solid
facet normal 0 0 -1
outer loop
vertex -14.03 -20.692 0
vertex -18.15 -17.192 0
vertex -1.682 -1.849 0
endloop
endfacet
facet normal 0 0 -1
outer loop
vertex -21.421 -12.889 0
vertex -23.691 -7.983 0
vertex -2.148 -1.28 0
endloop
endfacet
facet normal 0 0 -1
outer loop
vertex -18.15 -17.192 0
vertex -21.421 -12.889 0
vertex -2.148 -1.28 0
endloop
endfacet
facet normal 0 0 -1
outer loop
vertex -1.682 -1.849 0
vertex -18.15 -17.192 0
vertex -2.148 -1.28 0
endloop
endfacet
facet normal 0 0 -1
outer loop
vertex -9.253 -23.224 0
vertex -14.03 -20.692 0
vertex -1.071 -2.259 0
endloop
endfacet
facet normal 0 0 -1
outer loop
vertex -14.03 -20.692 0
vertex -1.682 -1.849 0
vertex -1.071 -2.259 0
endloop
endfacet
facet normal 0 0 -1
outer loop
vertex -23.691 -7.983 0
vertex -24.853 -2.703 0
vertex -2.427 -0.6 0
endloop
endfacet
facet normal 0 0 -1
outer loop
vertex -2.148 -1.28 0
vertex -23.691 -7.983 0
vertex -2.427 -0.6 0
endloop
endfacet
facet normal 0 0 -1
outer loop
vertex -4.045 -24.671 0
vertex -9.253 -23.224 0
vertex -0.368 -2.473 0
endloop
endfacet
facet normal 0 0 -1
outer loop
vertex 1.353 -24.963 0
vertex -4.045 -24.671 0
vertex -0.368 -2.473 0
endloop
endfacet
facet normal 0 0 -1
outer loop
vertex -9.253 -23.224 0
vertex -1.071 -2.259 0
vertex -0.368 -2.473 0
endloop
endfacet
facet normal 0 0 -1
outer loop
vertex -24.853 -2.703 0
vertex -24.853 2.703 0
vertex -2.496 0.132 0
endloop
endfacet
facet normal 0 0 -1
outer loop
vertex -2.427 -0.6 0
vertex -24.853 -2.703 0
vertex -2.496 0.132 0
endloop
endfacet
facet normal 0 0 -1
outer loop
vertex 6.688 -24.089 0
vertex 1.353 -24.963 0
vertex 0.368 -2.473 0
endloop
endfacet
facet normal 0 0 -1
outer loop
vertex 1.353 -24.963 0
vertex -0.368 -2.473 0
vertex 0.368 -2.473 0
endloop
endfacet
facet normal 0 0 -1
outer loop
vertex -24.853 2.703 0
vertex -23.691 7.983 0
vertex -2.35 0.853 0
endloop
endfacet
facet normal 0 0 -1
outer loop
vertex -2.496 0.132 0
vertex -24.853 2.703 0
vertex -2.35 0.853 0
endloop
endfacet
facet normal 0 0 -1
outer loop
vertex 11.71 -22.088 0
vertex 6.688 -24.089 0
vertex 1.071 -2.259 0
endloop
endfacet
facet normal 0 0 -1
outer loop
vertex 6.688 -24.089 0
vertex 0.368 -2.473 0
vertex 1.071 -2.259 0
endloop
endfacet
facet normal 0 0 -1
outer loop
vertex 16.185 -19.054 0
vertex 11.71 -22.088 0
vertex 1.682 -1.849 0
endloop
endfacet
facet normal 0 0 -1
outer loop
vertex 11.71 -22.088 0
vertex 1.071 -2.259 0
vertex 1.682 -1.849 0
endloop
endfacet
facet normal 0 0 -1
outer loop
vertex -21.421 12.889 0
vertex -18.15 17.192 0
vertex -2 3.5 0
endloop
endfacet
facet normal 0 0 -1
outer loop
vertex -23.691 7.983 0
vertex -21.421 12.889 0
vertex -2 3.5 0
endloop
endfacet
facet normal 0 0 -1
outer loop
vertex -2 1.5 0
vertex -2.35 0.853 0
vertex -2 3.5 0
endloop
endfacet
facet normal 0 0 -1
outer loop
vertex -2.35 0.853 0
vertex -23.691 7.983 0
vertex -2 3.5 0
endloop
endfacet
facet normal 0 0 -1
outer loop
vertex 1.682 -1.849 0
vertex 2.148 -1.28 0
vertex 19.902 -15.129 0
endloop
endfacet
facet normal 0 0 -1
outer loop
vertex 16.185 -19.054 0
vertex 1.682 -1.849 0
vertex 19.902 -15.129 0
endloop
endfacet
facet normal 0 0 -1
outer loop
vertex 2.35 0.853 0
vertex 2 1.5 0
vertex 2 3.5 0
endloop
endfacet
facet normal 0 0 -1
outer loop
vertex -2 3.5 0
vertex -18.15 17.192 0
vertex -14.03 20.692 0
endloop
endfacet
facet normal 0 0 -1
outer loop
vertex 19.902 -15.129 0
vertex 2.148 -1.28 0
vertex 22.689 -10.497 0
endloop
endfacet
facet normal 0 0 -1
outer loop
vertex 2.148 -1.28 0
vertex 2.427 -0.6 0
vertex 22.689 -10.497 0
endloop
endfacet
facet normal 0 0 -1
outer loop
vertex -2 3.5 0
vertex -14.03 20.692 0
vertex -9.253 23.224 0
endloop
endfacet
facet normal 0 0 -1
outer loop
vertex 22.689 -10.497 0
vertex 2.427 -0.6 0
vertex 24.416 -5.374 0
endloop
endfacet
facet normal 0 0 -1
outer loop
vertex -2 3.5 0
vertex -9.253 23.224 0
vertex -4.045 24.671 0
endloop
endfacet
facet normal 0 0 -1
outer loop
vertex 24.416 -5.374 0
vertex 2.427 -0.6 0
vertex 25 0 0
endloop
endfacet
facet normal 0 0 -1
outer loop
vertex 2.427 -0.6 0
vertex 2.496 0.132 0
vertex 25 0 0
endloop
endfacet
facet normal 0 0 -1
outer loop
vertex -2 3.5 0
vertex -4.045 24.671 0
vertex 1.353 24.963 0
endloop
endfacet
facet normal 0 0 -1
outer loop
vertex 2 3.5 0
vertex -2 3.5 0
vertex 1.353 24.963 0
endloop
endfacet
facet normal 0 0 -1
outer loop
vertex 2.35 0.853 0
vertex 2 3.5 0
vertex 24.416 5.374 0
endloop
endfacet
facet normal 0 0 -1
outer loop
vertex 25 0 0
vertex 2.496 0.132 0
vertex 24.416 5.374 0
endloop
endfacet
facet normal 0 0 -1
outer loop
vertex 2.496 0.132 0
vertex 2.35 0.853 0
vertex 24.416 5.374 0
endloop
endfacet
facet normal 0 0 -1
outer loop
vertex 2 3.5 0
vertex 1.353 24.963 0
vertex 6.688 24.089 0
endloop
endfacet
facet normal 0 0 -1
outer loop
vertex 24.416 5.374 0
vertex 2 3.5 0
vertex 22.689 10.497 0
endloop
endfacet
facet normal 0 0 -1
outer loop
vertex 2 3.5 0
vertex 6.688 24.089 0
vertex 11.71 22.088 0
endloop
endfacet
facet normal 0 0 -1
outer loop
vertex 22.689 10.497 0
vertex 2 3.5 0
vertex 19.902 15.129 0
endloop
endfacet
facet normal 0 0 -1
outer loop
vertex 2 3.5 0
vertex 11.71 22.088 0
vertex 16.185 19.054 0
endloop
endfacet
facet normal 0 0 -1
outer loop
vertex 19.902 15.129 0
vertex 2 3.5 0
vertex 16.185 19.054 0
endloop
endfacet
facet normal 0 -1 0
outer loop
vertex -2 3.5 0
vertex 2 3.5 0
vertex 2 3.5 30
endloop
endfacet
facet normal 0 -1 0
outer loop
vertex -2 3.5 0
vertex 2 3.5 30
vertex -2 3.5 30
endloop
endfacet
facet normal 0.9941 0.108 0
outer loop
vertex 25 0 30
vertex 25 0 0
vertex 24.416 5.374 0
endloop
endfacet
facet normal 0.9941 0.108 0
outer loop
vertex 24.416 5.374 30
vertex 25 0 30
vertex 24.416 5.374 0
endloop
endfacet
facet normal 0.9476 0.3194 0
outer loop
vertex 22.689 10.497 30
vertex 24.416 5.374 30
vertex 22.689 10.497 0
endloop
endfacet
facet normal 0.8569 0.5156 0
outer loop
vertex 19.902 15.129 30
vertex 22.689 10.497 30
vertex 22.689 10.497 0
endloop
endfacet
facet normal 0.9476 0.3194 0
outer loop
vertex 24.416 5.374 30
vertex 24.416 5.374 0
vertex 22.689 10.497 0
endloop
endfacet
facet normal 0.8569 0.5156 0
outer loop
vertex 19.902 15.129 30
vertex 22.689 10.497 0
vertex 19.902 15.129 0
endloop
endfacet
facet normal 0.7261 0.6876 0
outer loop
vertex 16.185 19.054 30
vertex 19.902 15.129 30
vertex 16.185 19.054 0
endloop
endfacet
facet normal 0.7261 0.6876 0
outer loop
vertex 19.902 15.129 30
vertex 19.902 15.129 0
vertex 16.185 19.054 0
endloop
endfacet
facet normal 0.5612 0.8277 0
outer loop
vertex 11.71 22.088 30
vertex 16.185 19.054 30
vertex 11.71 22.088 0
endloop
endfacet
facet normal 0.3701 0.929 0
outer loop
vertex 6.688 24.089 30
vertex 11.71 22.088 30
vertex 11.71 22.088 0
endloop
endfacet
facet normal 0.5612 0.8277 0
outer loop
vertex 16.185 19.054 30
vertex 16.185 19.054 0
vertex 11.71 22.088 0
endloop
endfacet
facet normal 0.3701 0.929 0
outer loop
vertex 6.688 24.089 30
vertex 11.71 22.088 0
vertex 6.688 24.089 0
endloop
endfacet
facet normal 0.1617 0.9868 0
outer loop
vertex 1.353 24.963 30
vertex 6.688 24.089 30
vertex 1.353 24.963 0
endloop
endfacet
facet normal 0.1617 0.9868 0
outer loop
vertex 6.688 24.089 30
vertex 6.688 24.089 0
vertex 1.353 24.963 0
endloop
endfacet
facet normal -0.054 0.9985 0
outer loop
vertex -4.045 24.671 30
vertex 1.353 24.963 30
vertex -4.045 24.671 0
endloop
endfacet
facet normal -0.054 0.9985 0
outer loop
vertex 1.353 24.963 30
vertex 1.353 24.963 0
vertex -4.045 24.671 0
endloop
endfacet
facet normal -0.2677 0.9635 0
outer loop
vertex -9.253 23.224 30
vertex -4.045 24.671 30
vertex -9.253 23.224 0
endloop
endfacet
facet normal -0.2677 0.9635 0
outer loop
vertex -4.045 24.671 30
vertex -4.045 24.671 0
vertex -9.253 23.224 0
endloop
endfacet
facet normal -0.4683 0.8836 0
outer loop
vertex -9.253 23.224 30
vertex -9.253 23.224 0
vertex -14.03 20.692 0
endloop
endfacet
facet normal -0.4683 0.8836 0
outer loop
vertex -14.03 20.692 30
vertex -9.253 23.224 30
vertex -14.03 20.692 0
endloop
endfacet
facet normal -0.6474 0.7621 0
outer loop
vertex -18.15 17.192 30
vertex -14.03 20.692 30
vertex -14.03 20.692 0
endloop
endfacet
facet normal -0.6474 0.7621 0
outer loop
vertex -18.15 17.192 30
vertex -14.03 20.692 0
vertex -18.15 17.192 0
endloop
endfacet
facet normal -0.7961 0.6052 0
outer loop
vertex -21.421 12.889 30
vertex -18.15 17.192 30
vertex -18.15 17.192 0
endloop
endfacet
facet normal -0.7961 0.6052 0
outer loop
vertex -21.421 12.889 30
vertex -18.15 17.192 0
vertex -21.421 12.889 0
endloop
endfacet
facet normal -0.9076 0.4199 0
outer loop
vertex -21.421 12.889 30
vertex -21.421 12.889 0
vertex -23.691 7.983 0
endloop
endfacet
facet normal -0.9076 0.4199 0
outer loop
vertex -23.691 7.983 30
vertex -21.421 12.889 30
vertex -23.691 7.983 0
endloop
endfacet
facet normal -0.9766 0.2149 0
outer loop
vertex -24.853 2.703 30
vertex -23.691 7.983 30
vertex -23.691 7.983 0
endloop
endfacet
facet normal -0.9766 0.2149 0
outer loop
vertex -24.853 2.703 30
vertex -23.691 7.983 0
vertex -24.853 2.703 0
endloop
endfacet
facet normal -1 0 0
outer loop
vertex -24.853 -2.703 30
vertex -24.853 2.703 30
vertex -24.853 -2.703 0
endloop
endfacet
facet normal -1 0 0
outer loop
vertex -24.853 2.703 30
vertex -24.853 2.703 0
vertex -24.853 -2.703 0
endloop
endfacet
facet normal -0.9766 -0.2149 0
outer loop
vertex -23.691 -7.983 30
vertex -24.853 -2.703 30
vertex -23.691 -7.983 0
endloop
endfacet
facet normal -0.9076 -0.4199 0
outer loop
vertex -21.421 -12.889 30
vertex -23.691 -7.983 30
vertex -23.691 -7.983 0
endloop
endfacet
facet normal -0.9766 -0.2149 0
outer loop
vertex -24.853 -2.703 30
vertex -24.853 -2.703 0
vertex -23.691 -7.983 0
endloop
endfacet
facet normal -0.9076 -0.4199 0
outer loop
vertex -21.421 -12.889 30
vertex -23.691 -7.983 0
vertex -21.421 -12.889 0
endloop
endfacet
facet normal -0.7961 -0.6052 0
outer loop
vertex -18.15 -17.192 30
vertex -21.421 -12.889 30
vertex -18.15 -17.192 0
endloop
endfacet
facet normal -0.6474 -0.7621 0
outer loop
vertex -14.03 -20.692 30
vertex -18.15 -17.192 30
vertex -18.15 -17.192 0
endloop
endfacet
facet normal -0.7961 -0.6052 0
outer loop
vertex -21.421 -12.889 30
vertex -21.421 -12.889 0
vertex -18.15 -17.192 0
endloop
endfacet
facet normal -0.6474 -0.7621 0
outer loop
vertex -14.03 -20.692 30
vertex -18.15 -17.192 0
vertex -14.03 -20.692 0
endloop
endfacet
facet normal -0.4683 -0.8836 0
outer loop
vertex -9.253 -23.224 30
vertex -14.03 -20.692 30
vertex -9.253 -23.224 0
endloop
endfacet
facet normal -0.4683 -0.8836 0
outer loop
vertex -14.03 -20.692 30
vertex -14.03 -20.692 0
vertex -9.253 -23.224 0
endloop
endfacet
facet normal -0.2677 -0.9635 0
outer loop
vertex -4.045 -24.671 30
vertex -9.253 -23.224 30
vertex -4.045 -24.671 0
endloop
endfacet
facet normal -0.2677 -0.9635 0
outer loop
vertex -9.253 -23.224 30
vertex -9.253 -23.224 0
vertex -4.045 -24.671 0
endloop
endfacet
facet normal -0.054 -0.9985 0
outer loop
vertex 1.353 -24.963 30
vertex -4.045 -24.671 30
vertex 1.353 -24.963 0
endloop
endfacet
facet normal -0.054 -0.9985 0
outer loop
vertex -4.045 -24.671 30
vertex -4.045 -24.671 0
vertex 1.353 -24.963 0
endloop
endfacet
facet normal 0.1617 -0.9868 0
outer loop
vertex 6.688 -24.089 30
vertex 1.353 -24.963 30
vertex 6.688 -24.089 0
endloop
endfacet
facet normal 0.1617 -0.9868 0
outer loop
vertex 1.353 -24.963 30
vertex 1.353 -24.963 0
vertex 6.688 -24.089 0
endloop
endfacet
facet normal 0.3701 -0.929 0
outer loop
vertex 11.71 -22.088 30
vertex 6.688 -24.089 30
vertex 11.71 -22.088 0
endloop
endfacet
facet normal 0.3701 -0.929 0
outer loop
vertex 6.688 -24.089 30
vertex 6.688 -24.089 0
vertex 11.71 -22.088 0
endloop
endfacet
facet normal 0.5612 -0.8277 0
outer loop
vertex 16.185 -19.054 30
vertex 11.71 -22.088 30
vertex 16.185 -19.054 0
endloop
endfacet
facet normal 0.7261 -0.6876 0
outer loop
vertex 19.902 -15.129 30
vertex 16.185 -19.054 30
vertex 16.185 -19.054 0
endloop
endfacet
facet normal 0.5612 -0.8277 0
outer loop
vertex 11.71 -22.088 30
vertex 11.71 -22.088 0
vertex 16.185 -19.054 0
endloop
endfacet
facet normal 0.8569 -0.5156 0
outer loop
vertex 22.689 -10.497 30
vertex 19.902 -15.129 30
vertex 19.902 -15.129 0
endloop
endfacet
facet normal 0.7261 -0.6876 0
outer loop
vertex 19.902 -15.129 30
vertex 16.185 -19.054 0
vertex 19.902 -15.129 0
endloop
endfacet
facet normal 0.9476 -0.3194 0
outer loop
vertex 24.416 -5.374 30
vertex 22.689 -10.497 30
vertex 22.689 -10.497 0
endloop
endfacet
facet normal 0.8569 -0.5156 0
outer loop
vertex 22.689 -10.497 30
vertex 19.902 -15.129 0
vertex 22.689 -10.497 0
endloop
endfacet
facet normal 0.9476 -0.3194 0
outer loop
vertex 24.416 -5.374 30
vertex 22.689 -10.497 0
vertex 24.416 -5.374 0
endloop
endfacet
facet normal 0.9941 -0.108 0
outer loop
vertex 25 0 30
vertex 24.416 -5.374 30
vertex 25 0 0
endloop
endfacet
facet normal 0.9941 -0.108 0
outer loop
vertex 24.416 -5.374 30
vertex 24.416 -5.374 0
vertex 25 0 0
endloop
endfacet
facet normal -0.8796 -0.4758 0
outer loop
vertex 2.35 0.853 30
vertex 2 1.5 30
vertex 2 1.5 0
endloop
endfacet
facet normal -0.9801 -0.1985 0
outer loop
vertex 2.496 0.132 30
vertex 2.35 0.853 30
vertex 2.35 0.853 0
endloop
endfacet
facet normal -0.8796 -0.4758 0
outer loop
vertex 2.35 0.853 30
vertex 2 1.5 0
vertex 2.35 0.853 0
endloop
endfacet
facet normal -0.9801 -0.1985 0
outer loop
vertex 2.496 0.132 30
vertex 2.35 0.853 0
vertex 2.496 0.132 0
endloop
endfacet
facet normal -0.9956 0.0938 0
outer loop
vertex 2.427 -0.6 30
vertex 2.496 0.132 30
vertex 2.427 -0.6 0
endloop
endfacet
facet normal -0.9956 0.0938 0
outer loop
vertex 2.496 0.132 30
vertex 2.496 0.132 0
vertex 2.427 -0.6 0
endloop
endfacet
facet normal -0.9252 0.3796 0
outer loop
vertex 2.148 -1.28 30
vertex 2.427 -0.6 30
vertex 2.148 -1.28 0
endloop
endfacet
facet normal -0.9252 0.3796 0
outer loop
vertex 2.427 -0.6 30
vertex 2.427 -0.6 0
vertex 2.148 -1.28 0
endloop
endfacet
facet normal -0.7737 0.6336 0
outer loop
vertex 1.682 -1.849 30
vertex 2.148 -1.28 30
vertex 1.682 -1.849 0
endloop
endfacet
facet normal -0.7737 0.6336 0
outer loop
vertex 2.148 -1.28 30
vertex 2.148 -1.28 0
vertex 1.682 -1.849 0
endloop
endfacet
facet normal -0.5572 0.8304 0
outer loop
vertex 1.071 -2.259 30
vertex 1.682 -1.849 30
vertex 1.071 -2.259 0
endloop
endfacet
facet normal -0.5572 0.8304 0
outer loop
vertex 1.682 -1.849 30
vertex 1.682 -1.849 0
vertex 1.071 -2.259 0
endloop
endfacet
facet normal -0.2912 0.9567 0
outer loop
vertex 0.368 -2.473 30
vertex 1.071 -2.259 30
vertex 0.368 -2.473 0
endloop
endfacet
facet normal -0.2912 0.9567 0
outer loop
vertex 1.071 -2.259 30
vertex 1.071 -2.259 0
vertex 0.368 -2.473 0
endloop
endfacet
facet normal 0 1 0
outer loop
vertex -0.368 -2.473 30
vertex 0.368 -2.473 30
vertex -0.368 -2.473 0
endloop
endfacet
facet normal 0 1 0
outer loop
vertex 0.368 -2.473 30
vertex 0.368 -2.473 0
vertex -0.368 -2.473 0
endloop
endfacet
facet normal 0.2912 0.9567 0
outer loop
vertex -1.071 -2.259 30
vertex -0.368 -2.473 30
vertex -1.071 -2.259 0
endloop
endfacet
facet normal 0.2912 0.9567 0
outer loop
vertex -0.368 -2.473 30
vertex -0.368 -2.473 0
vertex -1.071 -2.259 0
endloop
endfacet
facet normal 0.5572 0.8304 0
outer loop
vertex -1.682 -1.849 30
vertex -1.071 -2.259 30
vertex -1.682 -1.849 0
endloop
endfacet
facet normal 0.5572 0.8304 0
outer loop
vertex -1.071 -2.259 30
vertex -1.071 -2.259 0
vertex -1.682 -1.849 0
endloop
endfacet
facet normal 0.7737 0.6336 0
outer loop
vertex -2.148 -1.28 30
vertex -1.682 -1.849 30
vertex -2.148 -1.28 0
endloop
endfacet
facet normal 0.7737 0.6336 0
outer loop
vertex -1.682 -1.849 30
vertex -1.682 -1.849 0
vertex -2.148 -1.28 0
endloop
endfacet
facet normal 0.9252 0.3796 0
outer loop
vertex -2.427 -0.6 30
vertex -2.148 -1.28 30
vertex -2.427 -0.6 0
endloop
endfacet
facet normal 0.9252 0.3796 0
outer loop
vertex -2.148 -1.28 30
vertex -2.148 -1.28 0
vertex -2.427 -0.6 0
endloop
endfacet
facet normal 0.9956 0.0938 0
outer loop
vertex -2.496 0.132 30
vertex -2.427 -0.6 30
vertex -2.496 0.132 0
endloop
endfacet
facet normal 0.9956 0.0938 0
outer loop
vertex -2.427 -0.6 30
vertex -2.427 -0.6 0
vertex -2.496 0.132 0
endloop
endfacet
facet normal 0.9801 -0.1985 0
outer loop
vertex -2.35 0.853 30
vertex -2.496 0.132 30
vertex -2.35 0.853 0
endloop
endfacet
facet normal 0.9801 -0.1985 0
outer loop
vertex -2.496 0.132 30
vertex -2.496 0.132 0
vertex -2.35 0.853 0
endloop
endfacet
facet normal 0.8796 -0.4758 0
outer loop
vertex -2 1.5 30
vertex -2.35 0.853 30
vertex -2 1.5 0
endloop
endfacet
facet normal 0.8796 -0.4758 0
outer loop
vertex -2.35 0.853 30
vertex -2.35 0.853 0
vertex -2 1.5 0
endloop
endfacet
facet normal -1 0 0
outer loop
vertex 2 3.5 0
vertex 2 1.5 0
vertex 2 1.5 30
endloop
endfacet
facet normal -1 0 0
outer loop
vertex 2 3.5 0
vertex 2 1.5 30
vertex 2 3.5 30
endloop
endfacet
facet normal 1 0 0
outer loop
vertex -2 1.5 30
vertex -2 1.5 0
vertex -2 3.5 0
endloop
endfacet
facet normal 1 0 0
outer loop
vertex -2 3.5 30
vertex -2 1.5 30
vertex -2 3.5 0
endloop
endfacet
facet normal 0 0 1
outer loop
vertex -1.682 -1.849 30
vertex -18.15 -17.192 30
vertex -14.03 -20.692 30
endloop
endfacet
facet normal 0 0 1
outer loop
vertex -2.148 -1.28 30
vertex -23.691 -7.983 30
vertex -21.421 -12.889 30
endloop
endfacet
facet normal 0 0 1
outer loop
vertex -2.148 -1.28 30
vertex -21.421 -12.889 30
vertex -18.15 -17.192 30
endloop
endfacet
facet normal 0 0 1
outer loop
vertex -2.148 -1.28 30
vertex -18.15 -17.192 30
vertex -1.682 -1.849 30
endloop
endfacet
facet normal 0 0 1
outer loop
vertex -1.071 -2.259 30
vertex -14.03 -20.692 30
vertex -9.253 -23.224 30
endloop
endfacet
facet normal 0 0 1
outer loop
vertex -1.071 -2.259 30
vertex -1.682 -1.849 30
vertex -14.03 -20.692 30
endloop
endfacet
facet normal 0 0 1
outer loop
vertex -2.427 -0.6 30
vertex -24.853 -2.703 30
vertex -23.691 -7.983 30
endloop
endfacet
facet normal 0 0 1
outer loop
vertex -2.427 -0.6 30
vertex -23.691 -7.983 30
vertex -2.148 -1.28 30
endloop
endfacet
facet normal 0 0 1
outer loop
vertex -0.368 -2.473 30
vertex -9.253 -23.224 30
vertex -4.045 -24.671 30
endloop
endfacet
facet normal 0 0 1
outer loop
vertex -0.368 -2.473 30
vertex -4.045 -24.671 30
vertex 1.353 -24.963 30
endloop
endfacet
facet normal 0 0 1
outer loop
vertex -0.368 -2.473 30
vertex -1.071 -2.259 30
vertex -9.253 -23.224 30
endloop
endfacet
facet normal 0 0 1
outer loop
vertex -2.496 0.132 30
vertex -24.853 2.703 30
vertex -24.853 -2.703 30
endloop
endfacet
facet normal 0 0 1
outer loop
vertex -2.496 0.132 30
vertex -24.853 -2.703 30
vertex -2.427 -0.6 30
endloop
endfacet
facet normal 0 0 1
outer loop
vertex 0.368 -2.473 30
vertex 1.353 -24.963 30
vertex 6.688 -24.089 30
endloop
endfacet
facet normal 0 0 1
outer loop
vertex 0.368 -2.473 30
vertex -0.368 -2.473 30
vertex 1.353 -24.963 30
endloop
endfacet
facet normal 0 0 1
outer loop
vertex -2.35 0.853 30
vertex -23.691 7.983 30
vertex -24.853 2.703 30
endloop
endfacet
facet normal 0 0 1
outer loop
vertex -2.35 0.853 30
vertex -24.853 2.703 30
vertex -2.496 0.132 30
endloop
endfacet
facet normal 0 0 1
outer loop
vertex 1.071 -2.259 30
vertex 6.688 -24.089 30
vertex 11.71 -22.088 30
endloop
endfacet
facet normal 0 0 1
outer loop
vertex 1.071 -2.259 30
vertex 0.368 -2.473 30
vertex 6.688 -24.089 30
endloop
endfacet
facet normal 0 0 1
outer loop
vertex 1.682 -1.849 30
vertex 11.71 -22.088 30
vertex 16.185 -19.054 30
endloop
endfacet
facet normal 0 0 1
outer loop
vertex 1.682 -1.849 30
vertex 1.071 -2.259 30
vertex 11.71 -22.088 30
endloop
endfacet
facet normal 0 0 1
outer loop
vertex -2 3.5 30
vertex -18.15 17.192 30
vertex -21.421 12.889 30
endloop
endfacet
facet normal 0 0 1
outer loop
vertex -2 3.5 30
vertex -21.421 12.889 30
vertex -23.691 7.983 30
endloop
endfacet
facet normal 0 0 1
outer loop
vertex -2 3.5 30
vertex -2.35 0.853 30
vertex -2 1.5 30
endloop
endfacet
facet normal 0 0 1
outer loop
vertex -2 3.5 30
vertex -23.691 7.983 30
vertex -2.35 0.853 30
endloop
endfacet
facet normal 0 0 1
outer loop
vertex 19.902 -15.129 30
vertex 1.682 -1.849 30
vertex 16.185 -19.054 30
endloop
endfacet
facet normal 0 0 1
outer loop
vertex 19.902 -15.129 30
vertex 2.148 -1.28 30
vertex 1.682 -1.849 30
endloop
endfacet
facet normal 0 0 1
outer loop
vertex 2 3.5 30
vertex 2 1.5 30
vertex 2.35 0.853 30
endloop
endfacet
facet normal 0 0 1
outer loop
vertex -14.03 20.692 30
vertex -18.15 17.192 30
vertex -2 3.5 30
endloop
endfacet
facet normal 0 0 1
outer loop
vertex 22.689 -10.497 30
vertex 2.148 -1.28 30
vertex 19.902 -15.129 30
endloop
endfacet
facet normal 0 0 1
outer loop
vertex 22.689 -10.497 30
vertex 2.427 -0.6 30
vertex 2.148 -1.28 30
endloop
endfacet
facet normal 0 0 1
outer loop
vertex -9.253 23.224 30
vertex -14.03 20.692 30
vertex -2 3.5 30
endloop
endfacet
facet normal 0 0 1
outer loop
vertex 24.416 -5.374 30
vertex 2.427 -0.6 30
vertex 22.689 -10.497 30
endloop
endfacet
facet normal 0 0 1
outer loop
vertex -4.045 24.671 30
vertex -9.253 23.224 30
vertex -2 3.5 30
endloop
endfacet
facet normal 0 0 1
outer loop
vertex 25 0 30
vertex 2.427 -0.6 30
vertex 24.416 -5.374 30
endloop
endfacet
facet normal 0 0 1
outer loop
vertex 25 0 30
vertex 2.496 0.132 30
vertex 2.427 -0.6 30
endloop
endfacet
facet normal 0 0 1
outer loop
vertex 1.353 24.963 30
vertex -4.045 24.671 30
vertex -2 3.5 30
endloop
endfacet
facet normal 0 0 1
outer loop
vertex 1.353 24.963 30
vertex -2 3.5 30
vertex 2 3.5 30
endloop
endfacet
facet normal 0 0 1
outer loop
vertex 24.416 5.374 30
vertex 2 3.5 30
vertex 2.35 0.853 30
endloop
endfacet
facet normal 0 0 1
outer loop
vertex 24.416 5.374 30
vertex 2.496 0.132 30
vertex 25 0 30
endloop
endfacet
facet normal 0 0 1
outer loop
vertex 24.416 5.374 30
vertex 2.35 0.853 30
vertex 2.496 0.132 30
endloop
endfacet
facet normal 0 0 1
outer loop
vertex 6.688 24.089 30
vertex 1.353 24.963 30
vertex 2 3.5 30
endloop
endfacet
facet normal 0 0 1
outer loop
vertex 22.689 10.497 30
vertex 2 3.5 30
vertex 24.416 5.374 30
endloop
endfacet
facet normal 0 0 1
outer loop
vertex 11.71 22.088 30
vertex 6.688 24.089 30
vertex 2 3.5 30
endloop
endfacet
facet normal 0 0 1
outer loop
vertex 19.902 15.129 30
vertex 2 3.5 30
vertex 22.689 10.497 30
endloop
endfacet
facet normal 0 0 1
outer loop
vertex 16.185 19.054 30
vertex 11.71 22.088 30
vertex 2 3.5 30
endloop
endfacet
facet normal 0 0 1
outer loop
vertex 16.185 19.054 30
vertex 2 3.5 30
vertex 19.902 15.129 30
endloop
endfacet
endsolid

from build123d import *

# Parameters (mm, degrees)
ESQUISSE1_R             = 25
BOSS_EXTRU_1_DEPTH      = 30
ESQUISSE14_R            = 2.5
ENL_V_MAT_EXTRU_1_DEPTH = 47.368092477
ESQUISSE15_W            = 4
ESQUISSE15_H            = 2
ENL_V_MAT_EXTRU_2_DEPTH = 47.368092477


with BuildPart() as part:
    # Esquisse1 → Boss.-Extru.1 (new body)
    with BuildSketch(Plane.XY):
        Circle(ESQUISSE1_R)
    extrude(amount=BOSS_EXTRU_1_DEPTH)

    # Esquisse14 → Enlèv. mat.-Extru.1 (cut, through all)
    with BuildSketch(Plane(origin=(0, 0, 0), x_dir=(-1, 0, 0), z_dir=(0, 0, -1))):
        Circle(ESQUISSE14_R)
    extrude(amount=-ENL_V_MAT_EXTRU_1_DEPTH, mode=Mode.SUBTRACT)

    # Esquisse15 → Enlèv. mat.-Extru.2 (cut, through all)
    with BuildSketch(Plane(origin=(0, 0, 0), x_dir=(-1, 0, 0), z_dir=(0, 0, -1))):
        with Locations((0, 2.5)):
            Rectangle(ESQUISSE15_W, ESQUISSE15_H)
    extrude(amount=-ENL_V_MAT_EXTRU_2_DEPTH, mode=Mode.SUBTRACT)


solid = part.part
